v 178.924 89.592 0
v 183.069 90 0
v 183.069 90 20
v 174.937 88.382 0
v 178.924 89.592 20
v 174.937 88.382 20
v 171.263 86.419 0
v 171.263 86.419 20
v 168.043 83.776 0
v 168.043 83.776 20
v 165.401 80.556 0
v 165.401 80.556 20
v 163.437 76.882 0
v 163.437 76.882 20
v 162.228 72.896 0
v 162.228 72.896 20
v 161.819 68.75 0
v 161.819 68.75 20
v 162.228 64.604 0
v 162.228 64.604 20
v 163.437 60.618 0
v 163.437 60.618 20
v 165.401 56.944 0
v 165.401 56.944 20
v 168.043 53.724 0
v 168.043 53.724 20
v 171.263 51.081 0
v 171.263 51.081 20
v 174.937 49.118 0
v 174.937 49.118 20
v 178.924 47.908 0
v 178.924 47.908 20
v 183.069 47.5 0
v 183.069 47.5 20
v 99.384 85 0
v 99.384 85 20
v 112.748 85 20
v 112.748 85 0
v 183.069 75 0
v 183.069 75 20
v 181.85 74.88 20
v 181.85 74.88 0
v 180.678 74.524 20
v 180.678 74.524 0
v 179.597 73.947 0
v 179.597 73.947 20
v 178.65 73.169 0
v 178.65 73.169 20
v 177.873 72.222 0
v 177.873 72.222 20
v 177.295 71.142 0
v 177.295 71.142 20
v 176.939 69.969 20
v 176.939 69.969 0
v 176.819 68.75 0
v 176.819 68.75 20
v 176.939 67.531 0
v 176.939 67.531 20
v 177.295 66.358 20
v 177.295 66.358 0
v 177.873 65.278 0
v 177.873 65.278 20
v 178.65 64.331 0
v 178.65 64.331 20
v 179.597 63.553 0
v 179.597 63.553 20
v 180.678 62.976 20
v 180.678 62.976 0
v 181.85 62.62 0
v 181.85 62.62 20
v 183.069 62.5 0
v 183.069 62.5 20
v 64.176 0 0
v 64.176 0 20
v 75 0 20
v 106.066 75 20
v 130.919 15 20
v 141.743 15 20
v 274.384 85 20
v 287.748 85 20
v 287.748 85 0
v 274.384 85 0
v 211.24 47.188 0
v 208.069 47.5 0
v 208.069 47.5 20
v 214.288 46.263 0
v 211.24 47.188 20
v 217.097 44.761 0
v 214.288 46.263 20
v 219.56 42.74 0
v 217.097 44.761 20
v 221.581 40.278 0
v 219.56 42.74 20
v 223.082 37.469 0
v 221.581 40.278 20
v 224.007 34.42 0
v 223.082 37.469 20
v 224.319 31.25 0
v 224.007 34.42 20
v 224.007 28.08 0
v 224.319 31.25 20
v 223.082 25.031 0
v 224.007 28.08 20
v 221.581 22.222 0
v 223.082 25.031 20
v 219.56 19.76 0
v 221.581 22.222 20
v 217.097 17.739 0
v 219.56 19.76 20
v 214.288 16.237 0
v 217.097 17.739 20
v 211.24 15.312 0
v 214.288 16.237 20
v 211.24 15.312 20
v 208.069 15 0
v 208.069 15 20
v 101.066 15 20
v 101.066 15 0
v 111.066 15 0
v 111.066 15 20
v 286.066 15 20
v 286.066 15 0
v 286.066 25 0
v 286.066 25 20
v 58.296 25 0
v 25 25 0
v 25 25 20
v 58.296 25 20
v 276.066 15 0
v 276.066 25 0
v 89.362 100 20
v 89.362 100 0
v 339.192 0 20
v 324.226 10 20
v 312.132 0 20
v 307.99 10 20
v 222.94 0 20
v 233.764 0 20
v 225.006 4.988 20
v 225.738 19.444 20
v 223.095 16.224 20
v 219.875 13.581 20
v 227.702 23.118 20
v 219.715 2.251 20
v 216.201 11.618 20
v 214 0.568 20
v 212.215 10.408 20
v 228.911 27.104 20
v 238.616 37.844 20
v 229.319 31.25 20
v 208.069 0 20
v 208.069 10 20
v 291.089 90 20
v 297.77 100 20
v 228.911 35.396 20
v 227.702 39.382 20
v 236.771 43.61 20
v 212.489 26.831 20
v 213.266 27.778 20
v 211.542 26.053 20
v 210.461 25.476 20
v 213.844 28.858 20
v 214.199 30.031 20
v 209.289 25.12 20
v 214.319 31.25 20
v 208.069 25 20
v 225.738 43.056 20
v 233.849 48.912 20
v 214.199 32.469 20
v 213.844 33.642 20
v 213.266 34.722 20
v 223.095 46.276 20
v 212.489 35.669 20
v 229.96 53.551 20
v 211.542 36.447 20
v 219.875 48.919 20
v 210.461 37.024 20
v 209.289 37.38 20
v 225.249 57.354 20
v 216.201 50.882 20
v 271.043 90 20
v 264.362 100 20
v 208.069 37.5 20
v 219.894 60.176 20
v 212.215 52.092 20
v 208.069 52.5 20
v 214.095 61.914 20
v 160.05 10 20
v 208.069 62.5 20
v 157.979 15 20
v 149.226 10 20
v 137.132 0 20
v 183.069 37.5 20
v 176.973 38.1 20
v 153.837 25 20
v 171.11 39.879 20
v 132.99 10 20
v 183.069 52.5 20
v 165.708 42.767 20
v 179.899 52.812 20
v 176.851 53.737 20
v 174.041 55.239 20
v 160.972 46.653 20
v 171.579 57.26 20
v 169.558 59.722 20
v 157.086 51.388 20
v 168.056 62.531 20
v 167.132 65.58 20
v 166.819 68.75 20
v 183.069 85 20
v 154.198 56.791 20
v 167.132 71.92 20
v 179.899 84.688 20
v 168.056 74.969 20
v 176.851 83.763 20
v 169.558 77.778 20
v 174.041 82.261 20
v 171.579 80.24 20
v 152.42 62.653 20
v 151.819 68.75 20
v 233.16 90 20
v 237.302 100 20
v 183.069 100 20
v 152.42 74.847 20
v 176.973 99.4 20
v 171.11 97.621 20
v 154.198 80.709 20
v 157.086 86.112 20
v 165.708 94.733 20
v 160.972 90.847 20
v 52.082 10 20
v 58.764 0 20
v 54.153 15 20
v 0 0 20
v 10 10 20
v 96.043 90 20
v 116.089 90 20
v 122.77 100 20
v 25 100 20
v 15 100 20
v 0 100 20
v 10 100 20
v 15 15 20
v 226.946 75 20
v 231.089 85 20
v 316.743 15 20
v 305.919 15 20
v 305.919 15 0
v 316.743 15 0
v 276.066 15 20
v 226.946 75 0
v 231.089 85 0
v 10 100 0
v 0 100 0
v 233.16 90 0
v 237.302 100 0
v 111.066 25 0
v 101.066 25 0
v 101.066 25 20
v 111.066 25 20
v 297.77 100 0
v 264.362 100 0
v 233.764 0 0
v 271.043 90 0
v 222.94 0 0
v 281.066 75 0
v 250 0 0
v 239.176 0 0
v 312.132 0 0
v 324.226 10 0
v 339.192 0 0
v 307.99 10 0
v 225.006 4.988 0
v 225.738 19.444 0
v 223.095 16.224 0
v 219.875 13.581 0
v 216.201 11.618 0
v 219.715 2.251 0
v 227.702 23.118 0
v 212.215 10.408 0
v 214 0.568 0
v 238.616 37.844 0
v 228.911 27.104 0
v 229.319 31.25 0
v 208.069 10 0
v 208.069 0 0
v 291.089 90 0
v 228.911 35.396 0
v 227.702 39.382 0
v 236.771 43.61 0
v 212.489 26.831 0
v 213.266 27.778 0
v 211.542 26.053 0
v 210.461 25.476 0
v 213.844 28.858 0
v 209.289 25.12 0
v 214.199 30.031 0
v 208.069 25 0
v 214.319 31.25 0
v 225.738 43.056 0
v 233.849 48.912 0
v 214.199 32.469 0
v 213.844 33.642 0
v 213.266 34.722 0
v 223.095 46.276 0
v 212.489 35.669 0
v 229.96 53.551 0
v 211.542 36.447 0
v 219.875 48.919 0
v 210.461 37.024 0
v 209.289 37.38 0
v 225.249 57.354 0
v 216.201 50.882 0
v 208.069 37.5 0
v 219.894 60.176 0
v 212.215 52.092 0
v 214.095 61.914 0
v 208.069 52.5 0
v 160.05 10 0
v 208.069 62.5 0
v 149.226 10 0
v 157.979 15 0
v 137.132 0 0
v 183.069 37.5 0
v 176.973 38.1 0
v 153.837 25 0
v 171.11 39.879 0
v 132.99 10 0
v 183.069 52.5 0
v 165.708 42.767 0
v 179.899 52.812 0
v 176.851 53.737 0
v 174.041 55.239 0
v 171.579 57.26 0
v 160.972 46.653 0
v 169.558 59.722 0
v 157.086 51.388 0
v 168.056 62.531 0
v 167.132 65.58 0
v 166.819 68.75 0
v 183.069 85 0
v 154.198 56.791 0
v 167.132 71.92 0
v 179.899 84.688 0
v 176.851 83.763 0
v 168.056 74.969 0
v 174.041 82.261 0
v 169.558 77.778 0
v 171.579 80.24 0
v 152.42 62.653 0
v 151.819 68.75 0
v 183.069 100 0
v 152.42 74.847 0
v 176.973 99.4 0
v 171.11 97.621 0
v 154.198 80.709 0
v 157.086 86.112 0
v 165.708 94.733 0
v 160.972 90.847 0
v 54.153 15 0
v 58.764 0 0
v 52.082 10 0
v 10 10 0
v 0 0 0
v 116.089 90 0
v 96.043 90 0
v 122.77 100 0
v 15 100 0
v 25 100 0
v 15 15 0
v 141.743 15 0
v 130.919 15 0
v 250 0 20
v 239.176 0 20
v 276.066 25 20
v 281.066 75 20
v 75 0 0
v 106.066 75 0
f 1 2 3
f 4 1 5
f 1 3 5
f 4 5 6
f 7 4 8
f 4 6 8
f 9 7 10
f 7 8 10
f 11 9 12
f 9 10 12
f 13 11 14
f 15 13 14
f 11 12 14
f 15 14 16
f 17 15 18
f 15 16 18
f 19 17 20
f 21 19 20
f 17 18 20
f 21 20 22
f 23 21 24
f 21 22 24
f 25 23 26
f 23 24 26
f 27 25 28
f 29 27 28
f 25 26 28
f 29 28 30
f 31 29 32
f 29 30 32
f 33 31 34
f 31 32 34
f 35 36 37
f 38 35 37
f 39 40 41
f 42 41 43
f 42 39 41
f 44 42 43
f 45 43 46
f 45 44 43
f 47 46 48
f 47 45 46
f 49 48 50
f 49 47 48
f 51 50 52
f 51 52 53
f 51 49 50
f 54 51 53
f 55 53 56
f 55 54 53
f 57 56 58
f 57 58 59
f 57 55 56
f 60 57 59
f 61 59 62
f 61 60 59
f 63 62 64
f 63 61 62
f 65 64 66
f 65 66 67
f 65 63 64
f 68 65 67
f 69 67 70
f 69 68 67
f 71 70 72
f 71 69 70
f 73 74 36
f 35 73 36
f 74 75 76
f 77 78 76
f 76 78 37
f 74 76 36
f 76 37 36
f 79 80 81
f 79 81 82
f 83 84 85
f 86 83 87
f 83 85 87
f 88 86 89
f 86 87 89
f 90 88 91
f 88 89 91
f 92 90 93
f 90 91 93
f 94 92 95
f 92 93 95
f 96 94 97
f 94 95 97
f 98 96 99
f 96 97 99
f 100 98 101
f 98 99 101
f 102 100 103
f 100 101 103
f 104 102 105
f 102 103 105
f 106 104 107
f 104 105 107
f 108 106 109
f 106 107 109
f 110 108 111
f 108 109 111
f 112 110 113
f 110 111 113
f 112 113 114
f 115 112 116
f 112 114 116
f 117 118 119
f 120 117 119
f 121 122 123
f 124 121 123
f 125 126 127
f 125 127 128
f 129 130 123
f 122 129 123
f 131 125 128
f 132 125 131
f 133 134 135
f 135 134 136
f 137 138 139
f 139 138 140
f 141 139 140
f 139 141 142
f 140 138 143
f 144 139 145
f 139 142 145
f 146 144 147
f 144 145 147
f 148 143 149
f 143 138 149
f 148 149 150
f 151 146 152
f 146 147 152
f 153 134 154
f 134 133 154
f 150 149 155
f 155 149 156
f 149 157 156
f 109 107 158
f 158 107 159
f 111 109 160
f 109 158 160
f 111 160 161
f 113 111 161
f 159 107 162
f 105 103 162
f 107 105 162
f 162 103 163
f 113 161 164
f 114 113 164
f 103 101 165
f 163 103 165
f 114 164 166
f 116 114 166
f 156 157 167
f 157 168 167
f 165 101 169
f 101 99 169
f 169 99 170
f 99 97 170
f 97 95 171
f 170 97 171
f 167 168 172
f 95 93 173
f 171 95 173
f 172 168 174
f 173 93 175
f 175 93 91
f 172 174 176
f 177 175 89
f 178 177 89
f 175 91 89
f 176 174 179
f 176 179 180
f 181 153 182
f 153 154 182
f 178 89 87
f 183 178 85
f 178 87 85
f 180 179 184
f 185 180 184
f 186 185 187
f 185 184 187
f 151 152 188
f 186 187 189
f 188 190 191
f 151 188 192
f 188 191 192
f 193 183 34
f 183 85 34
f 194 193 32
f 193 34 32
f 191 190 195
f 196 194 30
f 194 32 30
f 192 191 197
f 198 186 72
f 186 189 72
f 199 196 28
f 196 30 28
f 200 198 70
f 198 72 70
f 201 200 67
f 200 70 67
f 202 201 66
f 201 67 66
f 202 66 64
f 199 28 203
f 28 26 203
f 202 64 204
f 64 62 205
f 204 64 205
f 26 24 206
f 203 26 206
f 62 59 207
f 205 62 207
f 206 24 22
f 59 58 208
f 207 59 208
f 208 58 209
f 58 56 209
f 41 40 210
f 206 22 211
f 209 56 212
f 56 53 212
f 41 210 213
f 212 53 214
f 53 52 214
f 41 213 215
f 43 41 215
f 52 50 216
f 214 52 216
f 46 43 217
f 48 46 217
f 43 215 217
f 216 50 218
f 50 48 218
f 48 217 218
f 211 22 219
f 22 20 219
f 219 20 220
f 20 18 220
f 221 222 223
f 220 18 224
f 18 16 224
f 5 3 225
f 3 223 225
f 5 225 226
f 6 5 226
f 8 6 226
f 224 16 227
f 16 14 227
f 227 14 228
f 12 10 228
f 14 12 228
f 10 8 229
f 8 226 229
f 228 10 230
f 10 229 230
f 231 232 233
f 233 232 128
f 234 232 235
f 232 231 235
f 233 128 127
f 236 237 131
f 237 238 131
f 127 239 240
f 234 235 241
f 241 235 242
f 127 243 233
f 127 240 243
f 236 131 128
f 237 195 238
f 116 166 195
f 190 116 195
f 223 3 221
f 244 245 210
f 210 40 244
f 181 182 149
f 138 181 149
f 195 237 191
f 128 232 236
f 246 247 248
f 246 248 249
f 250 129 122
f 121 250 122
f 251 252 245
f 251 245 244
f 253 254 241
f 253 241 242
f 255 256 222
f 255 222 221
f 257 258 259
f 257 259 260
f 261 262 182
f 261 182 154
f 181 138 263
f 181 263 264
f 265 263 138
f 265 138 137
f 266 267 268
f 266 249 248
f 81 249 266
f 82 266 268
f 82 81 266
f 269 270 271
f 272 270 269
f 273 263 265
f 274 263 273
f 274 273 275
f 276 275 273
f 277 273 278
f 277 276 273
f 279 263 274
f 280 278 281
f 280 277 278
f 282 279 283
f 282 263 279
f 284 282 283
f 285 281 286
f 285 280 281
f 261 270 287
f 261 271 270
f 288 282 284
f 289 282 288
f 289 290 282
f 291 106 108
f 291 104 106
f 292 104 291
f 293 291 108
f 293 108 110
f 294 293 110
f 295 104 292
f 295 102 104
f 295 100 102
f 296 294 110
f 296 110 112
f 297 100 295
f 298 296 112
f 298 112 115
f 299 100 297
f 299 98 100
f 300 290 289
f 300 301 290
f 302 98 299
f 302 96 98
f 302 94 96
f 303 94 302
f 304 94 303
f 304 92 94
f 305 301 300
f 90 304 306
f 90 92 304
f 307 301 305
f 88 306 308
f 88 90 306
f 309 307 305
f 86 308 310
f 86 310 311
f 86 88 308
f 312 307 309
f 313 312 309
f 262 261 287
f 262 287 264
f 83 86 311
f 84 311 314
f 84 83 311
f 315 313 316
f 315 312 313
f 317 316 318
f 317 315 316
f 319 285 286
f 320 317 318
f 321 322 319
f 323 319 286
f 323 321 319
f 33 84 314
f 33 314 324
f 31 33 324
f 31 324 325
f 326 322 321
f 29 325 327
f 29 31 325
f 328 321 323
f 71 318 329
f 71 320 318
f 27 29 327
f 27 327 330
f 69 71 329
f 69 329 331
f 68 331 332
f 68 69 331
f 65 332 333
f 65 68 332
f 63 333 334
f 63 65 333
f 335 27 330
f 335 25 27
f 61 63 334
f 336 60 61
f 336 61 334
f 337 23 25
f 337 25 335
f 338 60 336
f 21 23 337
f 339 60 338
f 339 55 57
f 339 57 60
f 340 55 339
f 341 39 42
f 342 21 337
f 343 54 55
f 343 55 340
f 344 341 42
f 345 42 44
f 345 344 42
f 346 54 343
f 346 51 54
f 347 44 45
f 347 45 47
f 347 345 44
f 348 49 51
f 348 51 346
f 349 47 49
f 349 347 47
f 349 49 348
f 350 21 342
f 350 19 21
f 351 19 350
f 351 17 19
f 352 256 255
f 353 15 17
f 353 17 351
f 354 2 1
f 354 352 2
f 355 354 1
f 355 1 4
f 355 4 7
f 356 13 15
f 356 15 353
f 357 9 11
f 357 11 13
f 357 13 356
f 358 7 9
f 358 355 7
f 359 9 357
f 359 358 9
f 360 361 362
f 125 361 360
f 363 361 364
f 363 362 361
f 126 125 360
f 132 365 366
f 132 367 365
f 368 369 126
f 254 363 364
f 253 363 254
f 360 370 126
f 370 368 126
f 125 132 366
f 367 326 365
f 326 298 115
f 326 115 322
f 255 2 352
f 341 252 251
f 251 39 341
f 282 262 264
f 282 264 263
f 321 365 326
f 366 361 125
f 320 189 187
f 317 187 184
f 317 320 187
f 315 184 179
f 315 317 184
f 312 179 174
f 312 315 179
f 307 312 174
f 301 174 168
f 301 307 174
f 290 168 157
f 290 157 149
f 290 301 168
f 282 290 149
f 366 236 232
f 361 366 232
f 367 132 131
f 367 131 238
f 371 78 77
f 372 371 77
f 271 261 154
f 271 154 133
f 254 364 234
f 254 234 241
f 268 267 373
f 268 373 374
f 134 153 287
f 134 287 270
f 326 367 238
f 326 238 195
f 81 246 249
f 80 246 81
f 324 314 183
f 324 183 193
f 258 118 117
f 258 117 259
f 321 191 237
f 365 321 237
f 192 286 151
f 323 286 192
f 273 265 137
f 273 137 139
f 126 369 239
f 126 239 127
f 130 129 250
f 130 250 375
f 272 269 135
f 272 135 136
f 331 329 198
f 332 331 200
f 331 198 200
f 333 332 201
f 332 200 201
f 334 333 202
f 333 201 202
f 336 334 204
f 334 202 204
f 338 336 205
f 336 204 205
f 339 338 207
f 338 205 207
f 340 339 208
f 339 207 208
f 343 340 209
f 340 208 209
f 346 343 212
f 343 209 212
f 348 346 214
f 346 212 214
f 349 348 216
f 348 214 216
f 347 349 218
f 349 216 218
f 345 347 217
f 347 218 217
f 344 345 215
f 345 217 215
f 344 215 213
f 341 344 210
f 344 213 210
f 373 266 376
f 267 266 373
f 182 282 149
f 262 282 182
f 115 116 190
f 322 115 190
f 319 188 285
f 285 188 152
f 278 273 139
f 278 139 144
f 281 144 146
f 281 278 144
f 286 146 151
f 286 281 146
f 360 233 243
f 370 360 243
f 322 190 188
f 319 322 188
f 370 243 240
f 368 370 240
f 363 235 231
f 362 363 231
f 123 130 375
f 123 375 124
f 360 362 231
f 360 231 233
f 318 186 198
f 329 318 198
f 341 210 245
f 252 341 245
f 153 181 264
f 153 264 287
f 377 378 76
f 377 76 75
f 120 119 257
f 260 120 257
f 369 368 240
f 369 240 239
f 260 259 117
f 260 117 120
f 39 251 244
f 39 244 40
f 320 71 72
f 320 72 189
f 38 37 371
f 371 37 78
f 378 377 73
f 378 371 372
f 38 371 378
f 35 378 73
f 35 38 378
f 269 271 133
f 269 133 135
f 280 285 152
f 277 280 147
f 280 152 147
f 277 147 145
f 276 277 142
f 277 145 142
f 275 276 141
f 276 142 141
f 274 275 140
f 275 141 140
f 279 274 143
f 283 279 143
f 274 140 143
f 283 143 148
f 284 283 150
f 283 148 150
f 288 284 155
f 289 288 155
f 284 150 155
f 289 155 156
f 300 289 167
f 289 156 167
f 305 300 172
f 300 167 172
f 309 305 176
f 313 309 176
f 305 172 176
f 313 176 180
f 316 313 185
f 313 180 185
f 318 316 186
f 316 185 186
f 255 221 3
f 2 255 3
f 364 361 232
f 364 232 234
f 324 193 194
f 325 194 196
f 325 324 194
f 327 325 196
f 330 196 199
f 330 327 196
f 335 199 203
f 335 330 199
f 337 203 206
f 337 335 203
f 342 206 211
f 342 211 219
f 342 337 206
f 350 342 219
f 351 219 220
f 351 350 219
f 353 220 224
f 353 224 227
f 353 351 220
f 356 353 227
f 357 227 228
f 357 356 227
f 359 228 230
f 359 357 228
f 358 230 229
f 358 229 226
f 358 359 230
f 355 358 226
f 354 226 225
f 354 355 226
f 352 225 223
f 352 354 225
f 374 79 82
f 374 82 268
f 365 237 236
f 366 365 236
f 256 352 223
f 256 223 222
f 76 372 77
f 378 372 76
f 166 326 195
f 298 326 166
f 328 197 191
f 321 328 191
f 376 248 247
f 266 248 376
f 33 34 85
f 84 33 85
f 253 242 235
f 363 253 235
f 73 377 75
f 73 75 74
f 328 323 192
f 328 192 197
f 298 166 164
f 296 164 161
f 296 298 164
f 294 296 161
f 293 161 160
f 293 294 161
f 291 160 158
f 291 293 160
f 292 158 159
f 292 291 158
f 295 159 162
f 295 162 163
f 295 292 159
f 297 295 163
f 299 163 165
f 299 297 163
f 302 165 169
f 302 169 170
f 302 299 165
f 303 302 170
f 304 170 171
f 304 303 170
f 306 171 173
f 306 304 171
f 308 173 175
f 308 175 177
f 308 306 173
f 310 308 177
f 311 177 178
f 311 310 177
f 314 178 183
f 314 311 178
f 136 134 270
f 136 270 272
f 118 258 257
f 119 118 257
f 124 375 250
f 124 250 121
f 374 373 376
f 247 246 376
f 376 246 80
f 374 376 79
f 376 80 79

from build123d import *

# Parameters (mm, degrees)
BOSS_EXTRUDE1_DEPTH   = 20
SKETCH2_W             = 10
SKETCH2_H             = 10
BOSS_EXTRUDE1_2_DEPTH = 20
BOSS_EXTRUDE1_3_DEPTH = 20
CUT_EXTRUDE1_DEPTH    = 21


with BuildPart() as part:
    # Sketch2 → Boss-Extrude1 (new body)
    with BuildSketch(Plane.XY):
        with BuildLine():
            Line((0, 0), (0, 100))
            Line((0, 100), (25, 100))
            Line((25, 100), (25, 25))
            Line((25, 25), (58.295534052, 25))
            Line((58.295534052, 25), (89.36155123, 100))
            Line((89.36155123, 100), (122.770483126, 100))
            Line((122.770483126, 100), (153.836500304, 25))
            Line((153.836500304, 25), (208.069315713, 25))
            ThreePointArc((208.069315713, 25), (214.319315713, 31.25), (208.069315713, 37.5))
            Line((208.069315713, 37.5), (183.069315713, 37.5))
            ThreePointArc((183.069315713, 37.5), (151.819315713, 68.75), (183.069315713, 100))
            Line((183.069315713, 100), (237.301746223, 100))
            Line((237.301746223, 100), (226.946407163, 75))
            Line((226.946407163, 75), (183.069315713, 75))
            ThreePointArc((183.069315713, 75), (176.819315713, 68.75), (183.069315713, 62.5))
            Line((183.069315713, 62.5), (208.069315713, 62.5))
            ThreePointArc((208.069315713, 62.5), (227.697097013, 55.566922117), (238.615698382, 37.844012879))
            Line((238.615698382, 37.844012879), (264.36155123, 100))
            Line((264.36155123, 100), (297.770483126, 100))
            Line((297.770483126, 100), (339.191839363, 0))
            Line((339.191839363, 0), (312.132034356, 0))
            Line((312.132034356, 0), (281.066017178, 75))
            Line((281.066017178, 75), (250, 0))
            Line((250, 0), (222.940194993, 0))
            Line((222.940194993, 0), (225.006198817, 4.987774452))
            ThreePointArc((225.006198817, 4.987774452), (216.897337905, 1.272866645), (208.069315713, 0))
            Line((208.069315713, 0), (137.132034356, 0))
            Line((137.132034356, 0), (106.066017178, 75))
            Line((106.066017178, 75), (75, 0))
            Line((75, 0), (0, 0))
        make_face()
    extrude(amount=BOSS_EXTRUDE1_DEPTH)

    # Sketch5 → Cut-Extrude1 (cut, through all)
    with BuildSketch(Plane.XY.offset(20)):
        Polygon((10, 100), (10, 10), (52.082330616, 10), (54.153398428, 15), (15, 15), (15, 100), align=None)
        Polygon((64.176077997, 0), (99.384230799, 85), (112.747803557, 85), (141.742752923, 15), (130.91883092, 15), (132.989898732, 10), (149.225781737, 10), (116.088696747, 90), (96.043337609, 90), (58.764116996, 0), align=None)
        with BuildLine():
            Line((231.088542787, 85), (233.159610599, 90))
            Line((233.159610599, 90), (183.069315713, 90))
            ThreePointArc((183.069315713, 90), (161.819315713, 68.75), (183.069315713, 47.5))
            Line((183.069315713, 47.5), (208.069315713, 47.5))
            ThreePointArc((208.069315713, 47.5), (224.319315713, 31.25), (208.069315713, 15))
            Line((208.069315713, 15), (157.978635928, 15))
            Line((157.978635928, 15), (160.04970374, 10))
            Line((160.04970374, 10), (208.069315713, 10))
            ThreePointArc((208.069315713, 10), (229.319315713, 31.25), (208.069315713, 52.5))
            Line((208.069315713, 52.5), (183.069315713, 52.5))
            ThreePointArc((183.069315713, 52.5), (166.819315713, 68.75), (183.069315713, 85))
            Line((183.069315713, 85), (231.088542787, 85))
        make_face()
        Polygon((239.176077997, 0), (233.764116996, 0), (271.043337609, 90), (291.088696747, 90), (324.225781737, 10), (307.989898732, 10), (305.91883092, 15), (316.742752923, 15), (287.747803557, 85), (274.384230799, 85), align=None)
    extrude(amount=-CUT_EXTRUDE1_DEPTH, mode=Mode.SUBTRACT)


with BuildPart() as body_2:
    # Sketch2 → Boss-Extrude1 2 (new body)
    with BuildSketch(Plane.XY):
        with Locations((106.066017178, 20)):
            Rectangle(SKETCH2_W, SKETCH2_H)
    extrude(amount=BOSS_EXTRUDE1_2_DEPTH)


with BuildPart() as body_3:
    # Sketch2 → Boss-Extrude1 3 (new body)
    with BuildSketch(Plane.XY):
        with Locations((281.066017178, 20)):
            Rectangle(SKETCH2_W, SKETCH2_H)
    extrude(amount=BOSS_EXTRUDE1_3_DEPTH)


solid = Compound([part.part, body_2.part, body_3.part])
